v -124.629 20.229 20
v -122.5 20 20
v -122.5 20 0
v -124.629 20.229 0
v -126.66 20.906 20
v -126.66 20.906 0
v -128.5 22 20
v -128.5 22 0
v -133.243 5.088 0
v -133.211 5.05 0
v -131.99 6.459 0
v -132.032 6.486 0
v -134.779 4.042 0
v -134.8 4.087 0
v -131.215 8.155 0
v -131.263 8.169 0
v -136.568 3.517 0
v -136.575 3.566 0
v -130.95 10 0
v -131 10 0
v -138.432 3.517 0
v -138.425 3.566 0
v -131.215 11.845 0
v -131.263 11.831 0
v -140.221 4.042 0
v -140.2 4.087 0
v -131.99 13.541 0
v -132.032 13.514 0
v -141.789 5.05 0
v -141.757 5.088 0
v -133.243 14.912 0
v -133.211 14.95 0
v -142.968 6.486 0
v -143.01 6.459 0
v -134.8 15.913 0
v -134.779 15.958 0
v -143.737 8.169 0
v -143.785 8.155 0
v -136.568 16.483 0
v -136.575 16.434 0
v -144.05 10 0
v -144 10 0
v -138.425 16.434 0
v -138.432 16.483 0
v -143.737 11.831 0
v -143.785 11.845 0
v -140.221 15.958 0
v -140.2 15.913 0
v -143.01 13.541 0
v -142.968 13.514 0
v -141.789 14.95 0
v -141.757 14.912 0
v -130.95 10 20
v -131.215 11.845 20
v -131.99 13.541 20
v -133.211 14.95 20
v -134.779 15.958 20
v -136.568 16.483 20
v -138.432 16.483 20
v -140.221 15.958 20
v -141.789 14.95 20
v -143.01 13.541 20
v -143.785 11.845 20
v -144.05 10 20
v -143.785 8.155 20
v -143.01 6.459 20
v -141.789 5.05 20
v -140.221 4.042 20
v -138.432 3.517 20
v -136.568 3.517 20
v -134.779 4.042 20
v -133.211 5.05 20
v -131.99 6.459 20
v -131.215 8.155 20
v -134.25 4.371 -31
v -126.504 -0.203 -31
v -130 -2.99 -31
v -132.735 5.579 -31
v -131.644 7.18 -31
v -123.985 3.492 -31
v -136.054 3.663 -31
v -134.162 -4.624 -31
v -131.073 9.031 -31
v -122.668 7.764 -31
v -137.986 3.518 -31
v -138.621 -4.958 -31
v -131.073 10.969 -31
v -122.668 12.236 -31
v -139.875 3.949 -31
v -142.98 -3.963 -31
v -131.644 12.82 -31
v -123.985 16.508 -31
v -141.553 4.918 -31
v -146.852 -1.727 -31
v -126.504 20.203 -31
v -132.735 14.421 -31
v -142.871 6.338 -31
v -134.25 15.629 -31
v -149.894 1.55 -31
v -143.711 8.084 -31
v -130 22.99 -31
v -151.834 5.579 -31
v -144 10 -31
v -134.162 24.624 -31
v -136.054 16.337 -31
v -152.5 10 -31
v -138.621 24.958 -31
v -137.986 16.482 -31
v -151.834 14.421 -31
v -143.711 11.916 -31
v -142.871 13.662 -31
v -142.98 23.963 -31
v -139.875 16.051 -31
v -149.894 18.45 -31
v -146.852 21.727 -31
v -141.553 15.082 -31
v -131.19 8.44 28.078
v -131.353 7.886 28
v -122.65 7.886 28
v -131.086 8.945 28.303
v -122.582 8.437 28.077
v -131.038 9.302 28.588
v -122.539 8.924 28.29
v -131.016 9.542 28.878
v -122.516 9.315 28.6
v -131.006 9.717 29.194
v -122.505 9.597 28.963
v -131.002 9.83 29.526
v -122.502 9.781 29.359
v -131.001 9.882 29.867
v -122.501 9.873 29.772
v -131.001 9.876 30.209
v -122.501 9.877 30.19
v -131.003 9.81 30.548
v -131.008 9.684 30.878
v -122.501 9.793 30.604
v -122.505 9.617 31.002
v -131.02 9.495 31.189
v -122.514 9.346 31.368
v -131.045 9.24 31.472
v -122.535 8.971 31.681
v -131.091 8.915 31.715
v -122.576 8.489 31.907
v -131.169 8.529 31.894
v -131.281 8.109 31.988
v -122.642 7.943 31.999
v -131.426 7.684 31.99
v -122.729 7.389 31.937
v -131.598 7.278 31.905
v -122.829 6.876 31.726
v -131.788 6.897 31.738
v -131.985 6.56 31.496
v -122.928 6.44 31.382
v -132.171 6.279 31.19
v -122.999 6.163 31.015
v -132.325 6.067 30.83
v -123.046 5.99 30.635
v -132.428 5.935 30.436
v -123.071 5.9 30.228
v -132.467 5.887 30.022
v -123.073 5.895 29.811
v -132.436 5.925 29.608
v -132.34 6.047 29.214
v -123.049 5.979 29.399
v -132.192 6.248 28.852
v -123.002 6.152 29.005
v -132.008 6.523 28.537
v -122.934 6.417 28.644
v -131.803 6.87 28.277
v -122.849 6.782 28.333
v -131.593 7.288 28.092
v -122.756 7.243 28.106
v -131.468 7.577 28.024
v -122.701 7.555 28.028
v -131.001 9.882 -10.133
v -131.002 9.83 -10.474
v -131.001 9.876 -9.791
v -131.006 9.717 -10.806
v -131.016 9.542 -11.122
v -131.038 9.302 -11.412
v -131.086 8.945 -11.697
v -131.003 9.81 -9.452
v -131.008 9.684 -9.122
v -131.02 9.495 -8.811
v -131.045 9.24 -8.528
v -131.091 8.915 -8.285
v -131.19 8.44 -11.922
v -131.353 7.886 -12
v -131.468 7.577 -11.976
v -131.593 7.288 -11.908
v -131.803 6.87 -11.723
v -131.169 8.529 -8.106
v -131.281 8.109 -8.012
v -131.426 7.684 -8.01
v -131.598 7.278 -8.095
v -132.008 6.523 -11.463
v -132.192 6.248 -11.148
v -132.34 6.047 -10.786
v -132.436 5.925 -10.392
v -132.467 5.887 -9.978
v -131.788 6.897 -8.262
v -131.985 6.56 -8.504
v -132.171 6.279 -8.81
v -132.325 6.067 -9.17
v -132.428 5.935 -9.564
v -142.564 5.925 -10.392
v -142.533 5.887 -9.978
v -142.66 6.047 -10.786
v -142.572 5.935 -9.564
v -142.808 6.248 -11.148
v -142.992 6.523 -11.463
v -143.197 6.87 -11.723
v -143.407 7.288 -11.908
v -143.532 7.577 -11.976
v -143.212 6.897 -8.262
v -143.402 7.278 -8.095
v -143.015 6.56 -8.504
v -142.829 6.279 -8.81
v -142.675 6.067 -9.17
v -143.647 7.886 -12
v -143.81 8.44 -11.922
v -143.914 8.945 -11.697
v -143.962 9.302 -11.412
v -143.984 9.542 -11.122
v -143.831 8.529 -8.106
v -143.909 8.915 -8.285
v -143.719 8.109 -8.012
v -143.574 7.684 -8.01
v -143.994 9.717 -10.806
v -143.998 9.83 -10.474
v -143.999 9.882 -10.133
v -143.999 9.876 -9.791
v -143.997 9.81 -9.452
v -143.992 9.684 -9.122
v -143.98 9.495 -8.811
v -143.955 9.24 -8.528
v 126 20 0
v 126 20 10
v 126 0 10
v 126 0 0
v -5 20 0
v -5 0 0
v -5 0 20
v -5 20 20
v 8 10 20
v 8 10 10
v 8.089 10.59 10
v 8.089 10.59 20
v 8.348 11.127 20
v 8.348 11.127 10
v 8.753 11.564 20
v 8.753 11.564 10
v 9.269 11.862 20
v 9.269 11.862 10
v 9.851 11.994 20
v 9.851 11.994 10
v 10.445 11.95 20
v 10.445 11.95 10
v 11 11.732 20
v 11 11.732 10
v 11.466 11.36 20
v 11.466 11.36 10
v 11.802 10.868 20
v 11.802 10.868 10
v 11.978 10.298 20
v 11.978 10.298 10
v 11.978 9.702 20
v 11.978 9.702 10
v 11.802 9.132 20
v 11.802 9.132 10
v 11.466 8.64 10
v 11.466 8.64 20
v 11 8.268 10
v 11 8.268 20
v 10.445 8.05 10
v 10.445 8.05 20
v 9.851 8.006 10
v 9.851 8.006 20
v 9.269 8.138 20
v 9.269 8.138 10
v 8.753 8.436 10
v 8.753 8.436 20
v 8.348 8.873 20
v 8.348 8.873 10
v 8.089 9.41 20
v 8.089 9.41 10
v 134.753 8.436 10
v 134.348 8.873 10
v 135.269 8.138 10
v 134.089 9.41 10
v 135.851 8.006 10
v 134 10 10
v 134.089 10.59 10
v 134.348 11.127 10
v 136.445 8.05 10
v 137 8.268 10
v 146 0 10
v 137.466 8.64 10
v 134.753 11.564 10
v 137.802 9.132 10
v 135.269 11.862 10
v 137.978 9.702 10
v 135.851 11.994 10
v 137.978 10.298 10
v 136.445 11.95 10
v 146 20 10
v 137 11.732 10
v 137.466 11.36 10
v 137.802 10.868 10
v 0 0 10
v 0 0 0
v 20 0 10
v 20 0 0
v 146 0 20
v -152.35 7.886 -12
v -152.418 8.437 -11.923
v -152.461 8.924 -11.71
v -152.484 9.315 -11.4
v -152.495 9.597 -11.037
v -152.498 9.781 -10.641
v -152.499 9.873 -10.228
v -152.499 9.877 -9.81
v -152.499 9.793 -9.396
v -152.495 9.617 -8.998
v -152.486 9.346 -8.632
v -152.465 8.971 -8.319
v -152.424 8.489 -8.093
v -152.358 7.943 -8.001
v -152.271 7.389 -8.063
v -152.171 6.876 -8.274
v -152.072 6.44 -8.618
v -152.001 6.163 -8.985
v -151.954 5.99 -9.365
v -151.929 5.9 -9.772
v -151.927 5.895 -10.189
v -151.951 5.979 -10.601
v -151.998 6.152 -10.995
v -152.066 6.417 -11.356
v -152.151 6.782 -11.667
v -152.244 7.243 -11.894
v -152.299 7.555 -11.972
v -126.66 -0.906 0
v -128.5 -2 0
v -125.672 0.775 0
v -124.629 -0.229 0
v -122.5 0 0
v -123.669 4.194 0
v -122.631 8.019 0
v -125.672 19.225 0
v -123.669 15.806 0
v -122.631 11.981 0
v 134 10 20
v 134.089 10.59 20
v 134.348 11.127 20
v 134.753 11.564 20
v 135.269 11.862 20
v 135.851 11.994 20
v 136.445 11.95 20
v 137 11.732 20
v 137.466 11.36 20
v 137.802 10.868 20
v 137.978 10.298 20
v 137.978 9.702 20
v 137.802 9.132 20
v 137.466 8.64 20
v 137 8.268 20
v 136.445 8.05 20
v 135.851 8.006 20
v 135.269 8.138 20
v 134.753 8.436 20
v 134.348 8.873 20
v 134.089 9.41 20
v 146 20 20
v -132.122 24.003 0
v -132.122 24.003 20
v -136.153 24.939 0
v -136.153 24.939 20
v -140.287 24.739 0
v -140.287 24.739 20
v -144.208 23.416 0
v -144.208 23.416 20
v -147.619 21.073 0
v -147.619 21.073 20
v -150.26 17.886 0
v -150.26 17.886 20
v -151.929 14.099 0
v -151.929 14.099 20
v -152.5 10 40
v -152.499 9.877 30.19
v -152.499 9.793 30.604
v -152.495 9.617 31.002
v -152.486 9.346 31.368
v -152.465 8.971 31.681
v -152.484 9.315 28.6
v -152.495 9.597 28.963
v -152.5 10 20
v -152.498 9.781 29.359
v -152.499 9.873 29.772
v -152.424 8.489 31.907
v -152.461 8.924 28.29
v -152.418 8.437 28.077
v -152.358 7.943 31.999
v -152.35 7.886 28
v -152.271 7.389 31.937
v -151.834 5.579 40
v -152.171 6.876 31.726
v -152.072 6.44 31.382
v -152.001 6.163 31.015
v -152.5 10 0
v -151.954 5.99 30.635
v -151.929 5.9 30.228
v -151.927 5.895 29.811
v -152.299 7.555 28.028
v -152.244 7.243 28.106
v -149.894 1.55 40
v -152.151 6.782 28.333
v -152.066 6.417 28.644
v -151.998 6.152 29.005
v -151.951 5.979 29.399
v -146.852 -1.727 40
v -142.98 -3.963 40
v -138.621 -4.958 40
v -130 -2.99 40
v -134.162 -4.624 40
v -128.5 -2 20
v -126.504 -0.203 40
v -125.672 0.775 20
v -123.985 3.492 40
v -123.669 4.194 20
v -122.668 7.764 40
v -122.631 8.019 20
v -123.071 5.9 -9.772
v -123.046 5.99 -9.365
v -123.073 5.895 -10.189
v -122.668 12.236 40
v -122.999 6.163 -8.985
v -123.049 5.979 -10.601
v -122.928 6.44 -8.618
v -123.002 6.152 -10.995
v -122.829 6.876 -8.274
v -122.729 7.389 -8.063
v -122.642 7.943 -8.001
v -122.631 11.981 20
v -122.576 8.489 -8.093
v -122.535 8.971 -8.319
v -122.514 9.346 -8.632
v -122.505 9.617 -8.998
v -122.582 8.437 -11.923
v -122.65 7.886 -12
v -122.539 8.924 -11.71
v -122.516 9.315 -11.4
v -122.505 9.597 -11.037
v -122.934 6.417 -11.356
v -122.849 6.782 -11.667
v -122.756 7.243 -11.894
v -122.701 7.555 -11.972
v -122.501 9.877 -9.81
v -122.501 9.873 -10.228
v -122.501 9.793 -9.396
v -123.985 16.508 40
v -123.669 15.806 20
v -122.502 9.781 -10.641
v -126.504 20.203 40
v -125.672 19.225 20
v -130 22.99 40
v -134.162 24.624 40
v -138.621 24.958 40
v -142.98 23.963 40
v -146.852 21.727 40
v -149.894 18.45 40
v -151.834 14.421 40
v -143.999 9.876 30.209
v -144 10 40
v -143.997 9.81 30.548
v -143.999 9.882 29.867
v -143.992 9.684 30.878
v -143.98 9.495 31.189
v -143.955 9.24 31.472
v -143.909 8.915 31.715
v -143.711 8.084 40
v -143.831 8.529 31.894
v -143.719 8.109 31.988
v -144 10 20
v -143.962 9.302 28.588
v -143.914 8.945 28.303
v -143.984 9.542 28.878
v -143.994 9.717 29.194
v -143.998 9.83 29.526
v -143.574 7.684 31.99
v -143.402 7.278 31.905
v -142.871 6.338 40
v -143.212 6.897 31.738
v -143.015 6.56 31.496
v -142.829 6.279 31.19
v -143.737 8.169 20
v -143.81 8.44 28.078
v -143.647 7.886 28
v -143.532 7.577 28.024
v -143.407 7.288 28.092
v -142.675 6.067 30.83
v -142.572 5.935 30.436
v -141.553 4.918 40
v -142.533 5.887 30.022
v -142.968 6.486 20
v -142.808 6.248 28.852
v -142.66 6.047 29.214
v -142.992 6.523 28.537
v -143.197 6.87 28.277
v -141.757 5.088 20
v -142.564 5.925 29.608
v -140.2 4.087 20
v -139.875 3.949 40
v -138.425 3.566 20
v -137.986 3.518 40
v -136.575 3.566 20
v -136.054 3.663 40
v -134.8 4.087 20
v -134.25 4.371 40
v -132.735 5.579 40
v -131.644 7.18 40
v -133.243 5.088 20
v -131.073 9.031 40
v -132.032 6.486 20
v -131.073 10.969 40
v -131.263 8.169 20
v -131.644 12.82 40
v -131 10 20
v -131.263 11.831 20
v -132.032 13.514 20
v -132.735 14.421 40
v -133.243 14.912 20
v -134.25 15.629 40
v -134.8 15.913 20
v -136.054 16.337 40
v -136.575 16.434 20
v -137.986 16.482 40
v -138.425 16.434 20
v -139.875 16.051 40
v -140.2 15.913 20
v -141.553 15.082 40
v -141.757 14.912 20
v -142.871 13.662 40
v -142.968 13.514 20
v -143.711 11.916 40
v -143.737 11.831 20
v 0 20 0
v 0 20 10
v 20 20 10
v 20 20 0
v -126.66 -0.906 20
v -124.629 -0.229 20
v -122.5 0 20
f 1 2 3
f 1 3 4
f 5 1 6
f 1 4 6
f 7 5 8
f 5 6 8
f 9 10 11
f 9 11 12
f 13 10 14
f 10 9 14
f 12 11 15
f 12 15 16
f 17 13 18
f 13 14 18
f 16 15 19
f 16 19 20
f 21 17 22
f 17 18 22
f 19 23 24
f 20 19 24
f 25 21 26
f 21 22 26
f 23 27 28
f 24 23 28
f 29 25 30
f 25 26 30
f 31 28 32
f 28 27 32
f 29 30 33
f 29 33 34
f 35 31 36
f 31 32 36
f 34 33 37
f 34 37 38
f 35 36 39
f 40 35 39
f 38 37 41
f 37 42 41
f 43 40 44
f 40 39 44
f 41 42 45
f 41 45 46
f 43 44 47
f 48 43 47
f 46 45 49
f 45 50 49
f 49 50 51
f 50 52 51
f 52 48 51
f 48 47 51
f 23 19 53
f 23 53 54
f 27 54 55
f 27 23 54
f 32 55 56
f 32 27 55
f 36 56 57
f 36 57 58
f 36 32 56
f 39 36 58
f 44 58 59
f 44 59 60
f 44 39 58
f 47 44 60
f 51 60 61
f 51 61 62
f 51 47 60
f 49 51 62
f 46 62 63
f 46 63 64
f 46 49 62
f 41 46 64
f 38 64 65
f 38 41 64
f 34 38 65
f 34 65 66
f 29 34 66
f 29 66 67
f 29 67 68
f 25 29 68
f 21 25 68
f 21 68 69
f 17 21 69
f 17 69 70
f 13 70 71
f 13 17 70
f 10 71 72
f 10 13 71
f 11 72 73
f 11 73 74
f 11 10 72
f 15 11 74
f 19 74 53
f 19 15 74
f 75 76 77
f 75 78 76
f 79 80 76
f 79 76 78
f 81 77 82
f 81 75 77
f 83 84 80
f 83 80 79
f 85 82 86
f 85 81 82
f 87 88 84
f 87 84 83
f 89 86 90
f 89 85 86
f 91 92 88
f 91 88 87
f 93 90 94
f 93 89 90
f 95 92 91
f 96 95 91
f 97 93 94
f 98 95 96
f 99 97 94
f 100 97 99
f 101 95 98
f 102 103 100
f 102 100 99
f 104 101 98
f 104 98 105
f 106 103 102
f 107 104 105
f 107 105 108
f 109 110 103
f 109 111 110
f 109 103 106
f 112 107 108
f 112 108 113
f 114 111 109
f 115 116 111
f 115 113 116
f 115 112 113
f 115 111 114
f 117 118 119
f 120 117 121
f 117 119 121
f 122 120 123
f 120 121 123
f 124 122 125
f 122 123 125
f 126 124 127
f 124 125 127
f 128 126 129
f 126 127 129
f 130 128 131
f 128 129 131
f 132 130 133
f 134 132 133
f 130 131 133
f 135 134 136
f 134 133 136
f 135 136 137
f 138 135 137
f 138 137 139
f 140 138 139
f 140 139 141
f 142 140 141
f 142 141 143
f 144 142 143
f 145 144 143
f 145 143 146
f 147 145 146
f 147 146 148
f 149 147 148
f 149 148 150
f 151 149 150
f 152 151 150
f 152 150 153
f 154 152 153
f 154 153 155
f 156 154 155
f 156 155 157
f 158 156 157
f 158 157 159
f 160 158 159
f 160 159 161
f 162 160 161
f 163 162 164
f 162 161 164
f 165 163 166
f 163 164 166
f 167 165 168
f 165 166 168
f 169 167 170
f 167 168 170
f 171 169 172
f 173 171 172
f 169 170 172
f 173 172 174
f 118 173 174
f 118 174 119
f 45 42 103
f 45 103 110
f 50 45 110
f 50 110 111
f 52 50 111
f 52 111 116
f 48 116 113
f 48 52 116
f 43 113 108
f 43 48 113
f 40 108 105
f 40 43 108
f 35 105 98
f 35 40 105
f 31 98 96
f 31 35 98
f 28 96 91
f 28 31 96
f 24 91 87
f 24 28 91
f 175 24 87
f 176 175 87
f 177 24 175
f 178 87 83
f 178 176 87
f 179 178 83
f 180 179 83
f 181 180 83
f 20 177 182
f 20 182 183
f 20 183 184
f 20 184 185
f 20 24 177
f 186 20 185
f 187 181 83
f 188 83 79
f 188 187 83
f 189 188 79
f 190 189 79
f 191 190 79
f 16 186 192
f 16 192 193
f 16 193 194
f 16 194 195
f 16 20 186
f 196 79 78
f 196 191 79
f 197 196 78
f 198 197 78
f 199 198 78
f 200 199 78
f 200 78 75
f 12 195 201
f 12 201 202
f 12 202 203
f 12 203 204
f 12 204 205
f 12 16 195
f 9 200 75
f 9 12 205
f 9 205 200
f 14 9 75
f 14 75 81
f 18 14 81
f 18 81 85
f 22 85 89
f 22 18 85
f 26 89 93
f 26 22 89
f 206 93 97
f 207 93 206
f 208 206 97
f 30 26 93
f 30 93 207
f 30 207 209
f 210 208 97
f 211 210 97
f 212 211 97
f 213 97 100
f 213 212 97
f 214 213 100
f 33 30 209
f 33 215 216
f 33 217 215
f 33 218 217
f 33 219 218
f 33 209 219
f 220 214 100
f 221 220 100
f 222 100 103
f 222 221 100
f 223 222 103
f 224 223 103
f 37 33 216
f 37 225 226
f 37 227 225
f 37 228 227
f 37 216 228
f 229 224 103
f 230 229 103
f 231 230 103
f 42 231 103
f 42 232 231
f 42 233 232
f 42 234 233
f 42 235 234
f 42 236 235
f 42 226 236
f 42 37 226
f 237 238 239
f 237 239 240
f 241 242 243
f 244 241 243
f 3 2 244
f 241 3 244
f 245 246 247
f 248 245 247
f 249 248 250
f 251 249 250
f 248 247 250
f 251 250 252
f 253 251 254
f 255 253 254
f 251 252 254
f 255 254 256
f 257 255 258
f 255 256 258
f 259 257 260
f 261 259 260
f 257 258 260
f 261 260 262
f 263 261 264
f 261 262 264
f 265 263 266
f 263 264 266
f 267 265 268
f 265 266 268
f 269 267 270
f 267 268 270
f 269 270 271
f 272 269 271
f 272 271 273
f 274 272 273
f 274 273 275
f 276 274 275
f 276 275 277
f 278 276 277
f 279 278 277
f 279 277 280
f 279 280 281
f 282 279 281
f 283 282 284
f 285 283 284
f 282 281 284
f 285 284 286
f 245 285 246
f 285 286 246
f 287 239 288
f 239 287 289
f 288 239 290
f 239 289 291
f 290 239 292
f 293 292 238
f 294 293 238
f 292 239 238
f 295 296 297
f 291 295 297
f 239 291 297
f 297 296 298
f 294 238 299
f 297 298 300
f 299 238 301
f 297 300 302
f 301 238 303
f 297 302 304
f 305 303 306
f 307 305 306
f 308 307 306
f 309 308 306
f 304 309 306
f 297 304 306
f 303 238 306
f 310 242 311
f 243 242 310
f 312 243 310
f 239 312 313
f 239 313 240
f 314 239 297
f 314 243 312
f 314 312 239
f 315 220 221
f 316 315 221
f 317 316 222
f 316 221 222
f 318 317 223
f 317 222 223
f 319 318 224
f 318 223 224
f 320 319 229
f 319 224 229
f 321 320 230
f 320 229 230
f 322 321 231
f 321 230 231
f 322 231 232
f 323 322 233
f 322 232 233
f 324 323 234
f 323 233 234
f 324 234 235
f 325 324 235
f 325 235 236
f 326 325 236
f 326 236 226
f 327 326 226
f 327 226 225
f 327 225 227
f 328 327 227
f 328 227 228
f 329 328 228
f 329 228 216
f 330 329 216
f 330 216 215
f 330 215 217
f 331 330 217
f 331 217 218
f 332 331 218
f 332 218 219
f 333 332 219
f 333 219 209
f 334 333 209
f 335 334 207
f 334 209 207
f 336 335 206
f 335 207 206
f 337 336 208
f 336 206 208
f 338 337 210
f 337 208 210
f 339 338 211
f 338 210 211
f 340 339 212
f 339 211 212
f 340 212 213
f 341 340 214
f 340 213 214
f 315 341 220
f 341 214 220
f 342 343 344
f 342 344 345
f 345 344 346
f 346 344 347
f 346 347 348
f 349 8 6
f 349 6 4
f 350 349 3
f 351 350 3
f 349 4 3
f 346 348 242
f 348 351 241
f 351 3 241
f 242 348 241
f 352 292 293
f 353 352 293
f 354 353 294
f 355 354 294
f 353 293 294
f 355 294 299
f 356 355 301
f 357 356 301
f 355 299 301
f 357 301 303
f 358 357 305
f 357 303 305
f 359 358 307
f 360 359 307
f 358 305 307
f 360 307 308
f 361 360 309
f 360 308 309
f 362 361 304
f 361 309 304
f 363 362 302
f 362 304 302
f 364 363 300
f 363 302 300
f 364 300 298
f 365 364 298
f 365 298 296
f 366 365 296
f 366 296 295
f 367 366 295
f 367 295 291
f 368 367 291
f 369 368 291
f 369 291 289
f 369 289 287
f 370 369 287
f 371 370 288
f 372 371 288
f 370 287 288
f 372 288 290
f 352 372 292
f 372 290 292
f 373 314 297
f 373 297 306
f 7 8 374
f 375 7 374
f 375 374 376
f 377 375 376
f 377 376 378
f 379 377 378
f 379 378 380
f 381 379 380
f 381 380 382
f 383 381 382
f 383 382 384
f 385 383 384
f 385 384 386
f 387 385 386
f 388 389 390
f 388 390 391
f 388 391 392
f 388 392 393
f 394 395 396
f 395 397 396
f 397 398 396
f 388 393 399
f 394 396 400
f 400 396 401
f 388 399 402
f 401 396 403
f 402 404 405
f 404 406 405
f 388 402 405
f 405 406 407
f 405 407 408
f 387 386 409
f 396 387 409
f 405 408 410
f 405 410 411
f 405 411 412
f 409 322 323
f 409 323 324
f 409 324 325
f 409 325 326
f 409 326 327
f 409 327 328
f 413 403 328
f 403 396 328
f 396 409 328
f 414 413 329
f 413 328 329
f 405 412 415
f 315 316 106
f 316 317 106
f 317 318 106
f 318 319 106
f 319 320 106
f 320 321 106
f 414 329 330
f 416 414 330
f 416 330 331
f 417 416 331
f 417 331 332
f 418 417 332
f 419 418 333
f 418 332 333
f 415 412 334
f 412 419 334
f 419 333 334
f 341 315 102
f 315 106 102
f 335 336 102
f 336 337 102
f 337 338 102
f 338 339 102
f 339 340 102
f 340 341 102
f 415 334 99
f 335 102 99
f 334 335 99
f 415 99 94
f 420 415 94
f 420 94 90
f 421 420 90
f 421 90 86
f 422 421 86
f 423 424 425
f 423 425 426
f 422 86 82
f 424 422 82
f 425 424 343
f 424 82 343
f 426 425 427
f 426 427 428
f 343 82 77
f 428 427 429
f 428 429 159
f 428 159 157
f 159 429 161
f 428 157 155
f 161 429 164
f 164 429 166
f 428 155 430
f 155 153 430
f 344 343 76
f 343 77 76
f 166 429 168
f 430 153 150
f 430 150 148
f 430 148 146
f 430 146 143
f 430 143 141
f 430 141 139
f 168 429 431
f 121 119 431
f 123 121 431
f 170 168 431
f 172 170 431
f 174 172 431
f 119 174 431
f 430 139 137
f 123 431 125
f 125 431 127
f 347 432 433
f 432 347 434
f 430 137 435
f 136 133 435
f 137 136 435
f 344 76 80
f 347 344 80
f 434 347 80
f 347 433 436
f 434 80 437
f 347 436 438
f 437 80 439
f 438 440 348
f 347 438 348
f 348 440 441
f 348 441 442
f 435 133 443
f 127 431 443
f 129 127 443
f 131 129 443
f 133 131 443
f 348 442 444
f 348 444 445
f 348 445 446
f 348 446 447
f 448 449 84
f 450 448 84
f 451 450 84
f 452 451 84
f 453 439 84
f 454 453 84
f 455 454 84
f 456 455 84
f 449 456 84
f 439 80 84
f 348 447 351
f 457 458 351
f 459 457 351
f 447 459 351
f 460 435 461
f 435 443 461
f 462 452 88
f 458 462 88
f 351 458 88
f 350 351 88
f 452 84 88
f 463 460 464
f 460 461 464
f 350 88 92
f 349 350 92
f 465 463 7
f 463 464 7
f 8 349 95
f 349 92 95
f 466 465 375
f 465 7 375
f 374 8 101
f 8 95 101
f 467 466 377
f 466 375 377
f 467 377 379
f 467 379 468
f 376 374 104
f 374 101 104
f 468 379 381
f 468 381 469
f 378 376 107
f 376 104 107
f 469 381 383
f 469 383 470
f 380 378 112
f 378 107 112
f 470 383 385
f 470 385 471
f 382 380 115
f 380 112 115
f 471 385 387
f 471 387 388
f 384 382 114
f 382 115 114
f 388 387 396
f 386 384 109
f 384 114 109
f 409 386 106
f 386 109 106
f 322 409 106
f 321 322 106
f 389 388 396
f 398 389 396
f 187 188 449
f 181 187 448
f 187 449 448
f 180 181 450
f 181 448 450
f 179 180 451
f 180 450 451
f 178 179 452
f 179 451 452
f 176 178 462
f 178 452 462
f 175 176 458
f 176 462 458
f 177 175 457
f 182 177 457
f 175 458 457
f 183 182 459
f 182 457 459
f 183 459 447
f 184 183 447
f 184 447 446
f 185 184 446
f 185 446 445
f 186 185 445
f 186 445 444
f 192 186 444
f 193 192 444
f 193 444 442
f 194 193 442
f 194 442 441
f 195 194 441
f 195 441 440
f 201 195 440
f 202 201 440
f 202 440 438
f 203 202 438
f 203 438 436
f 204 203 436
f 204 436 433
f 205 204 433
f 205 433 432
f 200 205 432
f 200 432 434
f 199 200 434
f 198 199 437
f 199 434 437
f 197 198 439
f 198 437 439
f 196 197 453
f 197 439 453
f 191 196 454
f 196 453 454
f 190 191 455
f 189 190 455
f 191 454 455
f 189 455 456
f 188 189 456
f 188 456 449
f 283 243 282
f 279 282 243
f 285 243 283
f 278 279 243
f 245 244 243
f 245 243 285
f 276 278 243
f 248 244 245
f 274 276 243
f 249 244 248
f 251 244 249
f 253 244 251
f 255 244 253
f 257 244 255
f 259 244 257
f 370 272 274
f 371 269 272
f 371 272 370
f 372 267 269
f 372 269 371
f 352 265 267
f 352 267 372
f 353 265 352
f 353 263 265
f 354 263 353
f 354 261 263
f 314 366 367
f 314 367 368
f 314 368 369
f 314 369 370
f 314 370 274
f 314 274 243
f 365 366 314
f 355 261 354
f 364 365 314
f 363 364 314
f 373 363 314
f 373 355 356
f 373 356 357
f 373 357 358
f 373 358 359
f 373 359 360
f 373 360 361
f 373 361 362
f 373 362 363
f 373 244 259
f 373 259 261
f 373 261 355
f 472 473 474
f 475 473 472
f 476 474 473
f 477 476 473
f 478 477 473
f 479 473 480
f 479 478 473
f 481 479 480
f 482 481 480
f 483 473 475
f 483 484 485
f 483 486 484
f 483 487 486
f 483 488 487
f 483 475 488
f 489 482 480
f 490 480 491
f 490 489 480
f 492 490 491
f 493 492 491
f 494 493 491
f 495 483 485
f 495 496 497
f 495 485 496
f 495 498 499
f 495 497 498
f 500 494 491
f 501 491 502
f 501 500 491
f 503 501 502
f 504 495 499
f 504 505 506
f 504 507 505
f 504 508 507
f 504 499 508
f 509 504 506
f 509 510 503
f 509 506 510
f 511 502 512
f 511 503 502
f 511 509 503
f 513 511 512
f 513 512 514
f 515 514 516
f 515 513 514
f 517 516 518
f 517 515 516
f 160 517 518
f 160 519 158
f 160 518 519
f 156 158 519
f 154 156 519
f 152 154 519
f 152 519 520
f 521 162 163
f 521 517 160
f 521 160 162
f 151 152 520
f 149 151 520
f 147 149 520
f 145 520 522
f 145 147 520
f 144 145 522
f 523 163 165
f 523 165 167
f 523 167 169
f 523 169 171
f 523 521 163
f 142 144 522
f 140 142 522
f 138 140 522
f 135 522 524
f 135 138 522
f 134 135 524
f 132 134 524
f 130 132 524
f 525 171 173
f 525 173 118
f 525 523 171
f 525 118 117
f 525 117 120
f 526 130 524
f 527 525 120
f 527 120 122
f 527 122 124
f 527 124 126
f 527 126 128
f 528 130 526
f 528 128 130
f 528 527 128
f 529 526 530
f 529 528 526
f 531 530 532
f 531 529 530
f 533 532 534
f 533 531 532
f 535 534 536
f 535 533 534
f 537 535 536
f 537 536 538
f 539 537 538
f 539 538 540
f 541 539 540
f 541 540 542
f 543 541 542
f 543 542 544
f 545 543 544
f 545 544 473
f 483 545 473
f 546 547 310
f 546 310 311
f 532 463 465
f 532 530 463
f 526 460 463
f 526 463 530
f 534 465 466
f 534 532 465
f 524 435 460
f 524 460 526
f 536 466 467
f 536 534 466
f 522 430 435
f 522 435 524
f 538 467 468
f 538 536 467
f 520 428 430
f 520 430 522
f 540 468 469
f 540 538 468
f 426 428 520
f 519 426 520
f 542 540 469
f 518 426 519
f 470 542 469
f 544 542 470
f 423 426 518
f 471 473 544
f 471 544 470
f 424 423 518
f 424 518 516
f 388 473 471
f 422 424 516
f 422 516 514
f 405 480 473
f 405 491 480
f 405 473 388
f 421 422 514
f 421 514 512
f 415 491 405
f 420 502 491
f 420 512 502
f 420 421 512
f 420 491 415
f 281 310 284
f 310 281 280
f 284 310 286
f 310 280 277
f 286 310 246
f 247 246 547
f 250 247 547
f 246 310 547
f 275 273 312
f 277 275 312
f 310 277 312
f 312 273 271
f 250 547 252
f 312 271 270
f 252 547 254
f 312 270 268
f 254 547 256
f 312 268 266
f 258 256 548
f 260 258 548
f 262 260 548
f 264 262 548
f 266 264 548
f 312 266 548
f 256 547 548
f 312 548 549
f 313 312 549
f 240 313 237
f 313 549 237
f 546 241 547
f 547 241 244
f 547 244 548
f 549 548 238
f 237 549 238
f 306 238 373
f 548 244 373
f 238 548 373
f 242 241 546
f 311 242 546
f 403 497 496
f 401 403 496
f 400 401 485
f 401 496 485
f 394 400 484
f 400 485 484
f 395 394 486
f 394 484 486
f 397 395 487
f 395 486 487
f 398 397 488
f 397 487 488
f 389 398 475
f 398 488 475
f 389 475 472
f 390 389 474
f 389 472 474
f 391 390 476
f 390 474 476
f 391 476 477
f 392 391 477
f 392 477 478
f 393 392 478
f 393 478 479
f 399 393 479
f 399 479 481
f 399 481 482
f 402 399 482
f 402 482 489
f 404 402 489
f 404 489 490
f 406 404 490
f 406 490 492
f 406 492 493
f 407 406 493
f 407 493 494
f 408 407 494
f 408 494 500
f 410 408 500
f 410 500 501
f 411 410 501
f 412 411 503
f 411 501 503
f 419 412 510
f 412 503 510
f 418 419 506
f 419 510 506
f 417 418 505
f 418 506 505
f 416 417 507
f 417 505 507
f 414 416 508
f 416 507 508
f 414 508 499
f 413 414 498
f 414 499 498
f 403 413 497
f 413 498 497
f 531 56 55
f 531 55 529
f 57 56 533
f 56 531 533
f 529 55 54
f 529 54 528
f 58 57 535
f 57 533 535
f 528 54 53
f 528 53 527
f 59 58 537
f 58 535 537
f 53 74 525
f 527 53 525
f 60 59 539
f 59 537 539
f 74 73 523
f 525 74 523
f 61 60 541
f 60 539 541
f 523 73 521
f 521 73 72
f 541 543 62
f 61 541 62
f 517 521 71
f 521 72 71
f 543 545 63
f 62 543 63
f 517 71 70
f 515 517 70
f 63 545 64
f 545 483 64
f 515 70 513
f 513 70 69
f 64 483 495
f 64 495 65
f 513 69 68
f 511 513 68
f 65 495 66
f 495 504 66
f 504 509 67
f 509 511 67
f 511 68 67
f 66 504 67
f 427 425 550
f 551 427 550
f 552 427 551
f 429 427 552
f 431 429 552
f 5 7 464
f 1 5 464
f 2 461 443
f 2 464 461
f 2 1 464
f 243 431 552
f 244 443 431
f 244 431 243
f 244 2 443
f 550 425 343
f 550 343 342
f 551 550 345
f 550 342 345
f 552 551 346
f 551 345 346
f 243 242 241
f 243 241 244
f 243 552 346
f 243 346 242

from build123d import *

# Parameters (mm, degrees)
SKETCH1_R              = 6.55
BOSS_EXTRUDE1_DEPTH    = 20
SKETCH2_R              = 15
SKETCH2_R_2            = 6.5
BOSS_EXTRUDE2_DEPTH    = 31
SKETCH3_R              = 15
SKETCH3_R_2            = 6.5
BOSS_EXTRUDE3_DEPTH    = 20
SKETCH4_W              = 146
SKETCH4_H              = 20
BOSS_EXTRUDE4_DEPTH    = 20
SKETCH7_W              = 20
SKETCH7_H              = 10
CUT_EXTRUDE1_DEPTH     = 20
SKETCH8_R              = 2
CUT_EXTRUDE2_DEPTH     = 10
SKETCH9_R              = 2
CUT_EXTRUDE3_DEPTH     = 273.611903629
SPLIT1_SURFACE_1_BACK  = 309.291
SPLIT1_SURFACE_1_DEPTH = 618.582
SPLIT1_SURFACE_2_BACK  = 309.291
SPLIT1_SURFACE_2_DEPTH = 618.582


with BuildPart() as part:
    # Sketch1 → Boss-Extrude1 (new body)
    with BuildSketch(Plane.XY):
        with BuildLine():
            Line((0, 0), (0, 20))
            Line((0, 20), (-122.5, 20))
            ThreePointArc((-122.5, 20), (-125.66227766, 20.513167019), (-128.5, 22))
            ThreePointArc((-128.5, 22), (-152.5, 10), (-128.5, -2))
            ThreePointArc((-128.5, -2), (-125.66227766, -0.513167019), (-122.5, 0))
            Line((-122.5, 0), (0, 0))
        make_face()
        with Locations((-137.5, 10)):
            Circle(SKETCH1_R, mode=Mode.SUBTRACT)
    extrude(amount=BOSS_EXTRUDE1_DEPTH)

    # Sketch2 → Boss-Extrude2 (add)
    with BuildSketch(Plane(origin=(0, 0, 0), x_dir=(-1, 0, 0), z_dir=(0, 0, -1))):
        with Locations((137.5, 10)):
            Circle(SKETCH2_R)
        with Locations((137.5, 10)):
            Circle(SKETCH2_R_2, mode=Mode.SUBTRACT)
    extrude(amount=BOSS_EXTRUDE2_DEPTH)

    # Sketch3 → Boss-Extrude3 (add)
    with BuildSketch(Plane.XY.offset(20)):
        with Locations(Location((-137.5, 10, 0), (0, 0, 180))):
            Circle(SKETCH3_R)
        with Locations(Location((-137.5, 10, 0), (0, 0, 180))):
            Circle(SKETCH3_R_2, mode=Mode.SUBTRACT)
    extrude(amount=BOSS_EXTRUDE3_DEPTH)

    # Sketch4 → Boss-Extrude4 (add)
    with BuildSketch(Plane.XY.offset(20)):
        with Locations((73, 10)):
            Rectangle(SKETCH4_W, SKETCH4_H)
    extrude(amount=-BOSS_EXTRUDE4_DEPTH)

    # Sketch7 → Cut-Extrude1 (cut)
    with BuildSketch(Plane(origin=(0, 20, 0), x_dir=(1, 0, 0), z_dir=(0, 1, 0))):
        with Locations((136, -5)):
            Rectangle(SKETCH7_W, SKETCH7_H)
        with Locations((10, -5)):
            Rectangle(SKETCH7_W, SKETCH7_H)
    extrude(amount=-CUT_EXTRUDE1_DEPTH, mode=Mode.SUBTRACT)

    # Sketch8 → Cut-Extrude2 (cut)
    with BuildSketch(Plane(origin=(0, 0, 10), x_dir=(-1, 0, 0), z_dir=(0, 0, -1))):
        with Locations((-136, 10)):
            Circle(SKETCH8_R)
        with Locations((-10, 10)):
            Circle(SKETCH8_R)
    extrude(amount=-CUT_EXTRUDE2_DEPTH, mode=Mode.SUBTRACT)

    # Sketch9 → Cut-Extrude3 (cut, through all)
    with BuildSketch(Plane(origin=(-122.5, 0, 0), x_dir=(0, 0, -1), z_dir=(1, 0, 0))):
        with Locations((-30, 7.88647696)):
            Circle(SKETCH9_R)
        with Locations((10, 7.88647696)):
            Circle(SKETCH9_R)
    extrude(amount=-CUT_EXTRUDE3_DEPTH, mode=Mode.SUBTRACT)


with BuildPart() as body_2:
    # Split1: the piece behind the surface
    add(part.part)
    # Split1 surface: a surface, the sketch's curves swept straight by 618.582 mm
    with BuildLine(Plane(origin=(0, 20, 0), x_dir=(1, 0, 0), z_dir=(0, 1, 0)).offset(-SPLIT1_SURFACE_1_BACK), mode=Mode.PRIVATE) as split1_surface_1_path:
        Line((-5, 0), (-5, -20))
    split1_surface_1 = Shell.extrude(split1_surface_1_path.wire(), (0 * SPLIT1_SURFACE_1_DEPTH, 1 * SPLIT1_SURFACE_1_DEPTH, 0 * SPLIT1_SURFACE_1_DEPTH))
    split(bisect_by=split1_surface_1, keep=Keep.BOTTOM)


with BuildPart() as part_1:
    add(part.part)

    # Split1: split by a surface, the side it looks to stays
    # Split1 surface: a surface, the sketch's curves swept straight by 618.582 mm
    with BuildLine(Plane(origin=(0, 20, 0), x_dir=(1, 0, 0), z_dir=(0, 1, 0)).offset(-SPLIT1_SURFACE_2_BACK), mode=Mode.PRIVATE) as split1_surface_2_path:
        Line((-5, 0), (-5, -20))
    split1_surface_2 = Shell.extrude(split1_surface_2_path.wire(), (0 * SPLIT1_SURFACE_2_DEPTH, 1 * SPLIT1_SURFACE_2_DEPTH, 0 * SPLIT1_SURFACE_2_DEPTH))
    split(bisect_by=split1_surface_2, keep=Keep.TOP)


solid = Compound([body_2.part, part_1.part])
